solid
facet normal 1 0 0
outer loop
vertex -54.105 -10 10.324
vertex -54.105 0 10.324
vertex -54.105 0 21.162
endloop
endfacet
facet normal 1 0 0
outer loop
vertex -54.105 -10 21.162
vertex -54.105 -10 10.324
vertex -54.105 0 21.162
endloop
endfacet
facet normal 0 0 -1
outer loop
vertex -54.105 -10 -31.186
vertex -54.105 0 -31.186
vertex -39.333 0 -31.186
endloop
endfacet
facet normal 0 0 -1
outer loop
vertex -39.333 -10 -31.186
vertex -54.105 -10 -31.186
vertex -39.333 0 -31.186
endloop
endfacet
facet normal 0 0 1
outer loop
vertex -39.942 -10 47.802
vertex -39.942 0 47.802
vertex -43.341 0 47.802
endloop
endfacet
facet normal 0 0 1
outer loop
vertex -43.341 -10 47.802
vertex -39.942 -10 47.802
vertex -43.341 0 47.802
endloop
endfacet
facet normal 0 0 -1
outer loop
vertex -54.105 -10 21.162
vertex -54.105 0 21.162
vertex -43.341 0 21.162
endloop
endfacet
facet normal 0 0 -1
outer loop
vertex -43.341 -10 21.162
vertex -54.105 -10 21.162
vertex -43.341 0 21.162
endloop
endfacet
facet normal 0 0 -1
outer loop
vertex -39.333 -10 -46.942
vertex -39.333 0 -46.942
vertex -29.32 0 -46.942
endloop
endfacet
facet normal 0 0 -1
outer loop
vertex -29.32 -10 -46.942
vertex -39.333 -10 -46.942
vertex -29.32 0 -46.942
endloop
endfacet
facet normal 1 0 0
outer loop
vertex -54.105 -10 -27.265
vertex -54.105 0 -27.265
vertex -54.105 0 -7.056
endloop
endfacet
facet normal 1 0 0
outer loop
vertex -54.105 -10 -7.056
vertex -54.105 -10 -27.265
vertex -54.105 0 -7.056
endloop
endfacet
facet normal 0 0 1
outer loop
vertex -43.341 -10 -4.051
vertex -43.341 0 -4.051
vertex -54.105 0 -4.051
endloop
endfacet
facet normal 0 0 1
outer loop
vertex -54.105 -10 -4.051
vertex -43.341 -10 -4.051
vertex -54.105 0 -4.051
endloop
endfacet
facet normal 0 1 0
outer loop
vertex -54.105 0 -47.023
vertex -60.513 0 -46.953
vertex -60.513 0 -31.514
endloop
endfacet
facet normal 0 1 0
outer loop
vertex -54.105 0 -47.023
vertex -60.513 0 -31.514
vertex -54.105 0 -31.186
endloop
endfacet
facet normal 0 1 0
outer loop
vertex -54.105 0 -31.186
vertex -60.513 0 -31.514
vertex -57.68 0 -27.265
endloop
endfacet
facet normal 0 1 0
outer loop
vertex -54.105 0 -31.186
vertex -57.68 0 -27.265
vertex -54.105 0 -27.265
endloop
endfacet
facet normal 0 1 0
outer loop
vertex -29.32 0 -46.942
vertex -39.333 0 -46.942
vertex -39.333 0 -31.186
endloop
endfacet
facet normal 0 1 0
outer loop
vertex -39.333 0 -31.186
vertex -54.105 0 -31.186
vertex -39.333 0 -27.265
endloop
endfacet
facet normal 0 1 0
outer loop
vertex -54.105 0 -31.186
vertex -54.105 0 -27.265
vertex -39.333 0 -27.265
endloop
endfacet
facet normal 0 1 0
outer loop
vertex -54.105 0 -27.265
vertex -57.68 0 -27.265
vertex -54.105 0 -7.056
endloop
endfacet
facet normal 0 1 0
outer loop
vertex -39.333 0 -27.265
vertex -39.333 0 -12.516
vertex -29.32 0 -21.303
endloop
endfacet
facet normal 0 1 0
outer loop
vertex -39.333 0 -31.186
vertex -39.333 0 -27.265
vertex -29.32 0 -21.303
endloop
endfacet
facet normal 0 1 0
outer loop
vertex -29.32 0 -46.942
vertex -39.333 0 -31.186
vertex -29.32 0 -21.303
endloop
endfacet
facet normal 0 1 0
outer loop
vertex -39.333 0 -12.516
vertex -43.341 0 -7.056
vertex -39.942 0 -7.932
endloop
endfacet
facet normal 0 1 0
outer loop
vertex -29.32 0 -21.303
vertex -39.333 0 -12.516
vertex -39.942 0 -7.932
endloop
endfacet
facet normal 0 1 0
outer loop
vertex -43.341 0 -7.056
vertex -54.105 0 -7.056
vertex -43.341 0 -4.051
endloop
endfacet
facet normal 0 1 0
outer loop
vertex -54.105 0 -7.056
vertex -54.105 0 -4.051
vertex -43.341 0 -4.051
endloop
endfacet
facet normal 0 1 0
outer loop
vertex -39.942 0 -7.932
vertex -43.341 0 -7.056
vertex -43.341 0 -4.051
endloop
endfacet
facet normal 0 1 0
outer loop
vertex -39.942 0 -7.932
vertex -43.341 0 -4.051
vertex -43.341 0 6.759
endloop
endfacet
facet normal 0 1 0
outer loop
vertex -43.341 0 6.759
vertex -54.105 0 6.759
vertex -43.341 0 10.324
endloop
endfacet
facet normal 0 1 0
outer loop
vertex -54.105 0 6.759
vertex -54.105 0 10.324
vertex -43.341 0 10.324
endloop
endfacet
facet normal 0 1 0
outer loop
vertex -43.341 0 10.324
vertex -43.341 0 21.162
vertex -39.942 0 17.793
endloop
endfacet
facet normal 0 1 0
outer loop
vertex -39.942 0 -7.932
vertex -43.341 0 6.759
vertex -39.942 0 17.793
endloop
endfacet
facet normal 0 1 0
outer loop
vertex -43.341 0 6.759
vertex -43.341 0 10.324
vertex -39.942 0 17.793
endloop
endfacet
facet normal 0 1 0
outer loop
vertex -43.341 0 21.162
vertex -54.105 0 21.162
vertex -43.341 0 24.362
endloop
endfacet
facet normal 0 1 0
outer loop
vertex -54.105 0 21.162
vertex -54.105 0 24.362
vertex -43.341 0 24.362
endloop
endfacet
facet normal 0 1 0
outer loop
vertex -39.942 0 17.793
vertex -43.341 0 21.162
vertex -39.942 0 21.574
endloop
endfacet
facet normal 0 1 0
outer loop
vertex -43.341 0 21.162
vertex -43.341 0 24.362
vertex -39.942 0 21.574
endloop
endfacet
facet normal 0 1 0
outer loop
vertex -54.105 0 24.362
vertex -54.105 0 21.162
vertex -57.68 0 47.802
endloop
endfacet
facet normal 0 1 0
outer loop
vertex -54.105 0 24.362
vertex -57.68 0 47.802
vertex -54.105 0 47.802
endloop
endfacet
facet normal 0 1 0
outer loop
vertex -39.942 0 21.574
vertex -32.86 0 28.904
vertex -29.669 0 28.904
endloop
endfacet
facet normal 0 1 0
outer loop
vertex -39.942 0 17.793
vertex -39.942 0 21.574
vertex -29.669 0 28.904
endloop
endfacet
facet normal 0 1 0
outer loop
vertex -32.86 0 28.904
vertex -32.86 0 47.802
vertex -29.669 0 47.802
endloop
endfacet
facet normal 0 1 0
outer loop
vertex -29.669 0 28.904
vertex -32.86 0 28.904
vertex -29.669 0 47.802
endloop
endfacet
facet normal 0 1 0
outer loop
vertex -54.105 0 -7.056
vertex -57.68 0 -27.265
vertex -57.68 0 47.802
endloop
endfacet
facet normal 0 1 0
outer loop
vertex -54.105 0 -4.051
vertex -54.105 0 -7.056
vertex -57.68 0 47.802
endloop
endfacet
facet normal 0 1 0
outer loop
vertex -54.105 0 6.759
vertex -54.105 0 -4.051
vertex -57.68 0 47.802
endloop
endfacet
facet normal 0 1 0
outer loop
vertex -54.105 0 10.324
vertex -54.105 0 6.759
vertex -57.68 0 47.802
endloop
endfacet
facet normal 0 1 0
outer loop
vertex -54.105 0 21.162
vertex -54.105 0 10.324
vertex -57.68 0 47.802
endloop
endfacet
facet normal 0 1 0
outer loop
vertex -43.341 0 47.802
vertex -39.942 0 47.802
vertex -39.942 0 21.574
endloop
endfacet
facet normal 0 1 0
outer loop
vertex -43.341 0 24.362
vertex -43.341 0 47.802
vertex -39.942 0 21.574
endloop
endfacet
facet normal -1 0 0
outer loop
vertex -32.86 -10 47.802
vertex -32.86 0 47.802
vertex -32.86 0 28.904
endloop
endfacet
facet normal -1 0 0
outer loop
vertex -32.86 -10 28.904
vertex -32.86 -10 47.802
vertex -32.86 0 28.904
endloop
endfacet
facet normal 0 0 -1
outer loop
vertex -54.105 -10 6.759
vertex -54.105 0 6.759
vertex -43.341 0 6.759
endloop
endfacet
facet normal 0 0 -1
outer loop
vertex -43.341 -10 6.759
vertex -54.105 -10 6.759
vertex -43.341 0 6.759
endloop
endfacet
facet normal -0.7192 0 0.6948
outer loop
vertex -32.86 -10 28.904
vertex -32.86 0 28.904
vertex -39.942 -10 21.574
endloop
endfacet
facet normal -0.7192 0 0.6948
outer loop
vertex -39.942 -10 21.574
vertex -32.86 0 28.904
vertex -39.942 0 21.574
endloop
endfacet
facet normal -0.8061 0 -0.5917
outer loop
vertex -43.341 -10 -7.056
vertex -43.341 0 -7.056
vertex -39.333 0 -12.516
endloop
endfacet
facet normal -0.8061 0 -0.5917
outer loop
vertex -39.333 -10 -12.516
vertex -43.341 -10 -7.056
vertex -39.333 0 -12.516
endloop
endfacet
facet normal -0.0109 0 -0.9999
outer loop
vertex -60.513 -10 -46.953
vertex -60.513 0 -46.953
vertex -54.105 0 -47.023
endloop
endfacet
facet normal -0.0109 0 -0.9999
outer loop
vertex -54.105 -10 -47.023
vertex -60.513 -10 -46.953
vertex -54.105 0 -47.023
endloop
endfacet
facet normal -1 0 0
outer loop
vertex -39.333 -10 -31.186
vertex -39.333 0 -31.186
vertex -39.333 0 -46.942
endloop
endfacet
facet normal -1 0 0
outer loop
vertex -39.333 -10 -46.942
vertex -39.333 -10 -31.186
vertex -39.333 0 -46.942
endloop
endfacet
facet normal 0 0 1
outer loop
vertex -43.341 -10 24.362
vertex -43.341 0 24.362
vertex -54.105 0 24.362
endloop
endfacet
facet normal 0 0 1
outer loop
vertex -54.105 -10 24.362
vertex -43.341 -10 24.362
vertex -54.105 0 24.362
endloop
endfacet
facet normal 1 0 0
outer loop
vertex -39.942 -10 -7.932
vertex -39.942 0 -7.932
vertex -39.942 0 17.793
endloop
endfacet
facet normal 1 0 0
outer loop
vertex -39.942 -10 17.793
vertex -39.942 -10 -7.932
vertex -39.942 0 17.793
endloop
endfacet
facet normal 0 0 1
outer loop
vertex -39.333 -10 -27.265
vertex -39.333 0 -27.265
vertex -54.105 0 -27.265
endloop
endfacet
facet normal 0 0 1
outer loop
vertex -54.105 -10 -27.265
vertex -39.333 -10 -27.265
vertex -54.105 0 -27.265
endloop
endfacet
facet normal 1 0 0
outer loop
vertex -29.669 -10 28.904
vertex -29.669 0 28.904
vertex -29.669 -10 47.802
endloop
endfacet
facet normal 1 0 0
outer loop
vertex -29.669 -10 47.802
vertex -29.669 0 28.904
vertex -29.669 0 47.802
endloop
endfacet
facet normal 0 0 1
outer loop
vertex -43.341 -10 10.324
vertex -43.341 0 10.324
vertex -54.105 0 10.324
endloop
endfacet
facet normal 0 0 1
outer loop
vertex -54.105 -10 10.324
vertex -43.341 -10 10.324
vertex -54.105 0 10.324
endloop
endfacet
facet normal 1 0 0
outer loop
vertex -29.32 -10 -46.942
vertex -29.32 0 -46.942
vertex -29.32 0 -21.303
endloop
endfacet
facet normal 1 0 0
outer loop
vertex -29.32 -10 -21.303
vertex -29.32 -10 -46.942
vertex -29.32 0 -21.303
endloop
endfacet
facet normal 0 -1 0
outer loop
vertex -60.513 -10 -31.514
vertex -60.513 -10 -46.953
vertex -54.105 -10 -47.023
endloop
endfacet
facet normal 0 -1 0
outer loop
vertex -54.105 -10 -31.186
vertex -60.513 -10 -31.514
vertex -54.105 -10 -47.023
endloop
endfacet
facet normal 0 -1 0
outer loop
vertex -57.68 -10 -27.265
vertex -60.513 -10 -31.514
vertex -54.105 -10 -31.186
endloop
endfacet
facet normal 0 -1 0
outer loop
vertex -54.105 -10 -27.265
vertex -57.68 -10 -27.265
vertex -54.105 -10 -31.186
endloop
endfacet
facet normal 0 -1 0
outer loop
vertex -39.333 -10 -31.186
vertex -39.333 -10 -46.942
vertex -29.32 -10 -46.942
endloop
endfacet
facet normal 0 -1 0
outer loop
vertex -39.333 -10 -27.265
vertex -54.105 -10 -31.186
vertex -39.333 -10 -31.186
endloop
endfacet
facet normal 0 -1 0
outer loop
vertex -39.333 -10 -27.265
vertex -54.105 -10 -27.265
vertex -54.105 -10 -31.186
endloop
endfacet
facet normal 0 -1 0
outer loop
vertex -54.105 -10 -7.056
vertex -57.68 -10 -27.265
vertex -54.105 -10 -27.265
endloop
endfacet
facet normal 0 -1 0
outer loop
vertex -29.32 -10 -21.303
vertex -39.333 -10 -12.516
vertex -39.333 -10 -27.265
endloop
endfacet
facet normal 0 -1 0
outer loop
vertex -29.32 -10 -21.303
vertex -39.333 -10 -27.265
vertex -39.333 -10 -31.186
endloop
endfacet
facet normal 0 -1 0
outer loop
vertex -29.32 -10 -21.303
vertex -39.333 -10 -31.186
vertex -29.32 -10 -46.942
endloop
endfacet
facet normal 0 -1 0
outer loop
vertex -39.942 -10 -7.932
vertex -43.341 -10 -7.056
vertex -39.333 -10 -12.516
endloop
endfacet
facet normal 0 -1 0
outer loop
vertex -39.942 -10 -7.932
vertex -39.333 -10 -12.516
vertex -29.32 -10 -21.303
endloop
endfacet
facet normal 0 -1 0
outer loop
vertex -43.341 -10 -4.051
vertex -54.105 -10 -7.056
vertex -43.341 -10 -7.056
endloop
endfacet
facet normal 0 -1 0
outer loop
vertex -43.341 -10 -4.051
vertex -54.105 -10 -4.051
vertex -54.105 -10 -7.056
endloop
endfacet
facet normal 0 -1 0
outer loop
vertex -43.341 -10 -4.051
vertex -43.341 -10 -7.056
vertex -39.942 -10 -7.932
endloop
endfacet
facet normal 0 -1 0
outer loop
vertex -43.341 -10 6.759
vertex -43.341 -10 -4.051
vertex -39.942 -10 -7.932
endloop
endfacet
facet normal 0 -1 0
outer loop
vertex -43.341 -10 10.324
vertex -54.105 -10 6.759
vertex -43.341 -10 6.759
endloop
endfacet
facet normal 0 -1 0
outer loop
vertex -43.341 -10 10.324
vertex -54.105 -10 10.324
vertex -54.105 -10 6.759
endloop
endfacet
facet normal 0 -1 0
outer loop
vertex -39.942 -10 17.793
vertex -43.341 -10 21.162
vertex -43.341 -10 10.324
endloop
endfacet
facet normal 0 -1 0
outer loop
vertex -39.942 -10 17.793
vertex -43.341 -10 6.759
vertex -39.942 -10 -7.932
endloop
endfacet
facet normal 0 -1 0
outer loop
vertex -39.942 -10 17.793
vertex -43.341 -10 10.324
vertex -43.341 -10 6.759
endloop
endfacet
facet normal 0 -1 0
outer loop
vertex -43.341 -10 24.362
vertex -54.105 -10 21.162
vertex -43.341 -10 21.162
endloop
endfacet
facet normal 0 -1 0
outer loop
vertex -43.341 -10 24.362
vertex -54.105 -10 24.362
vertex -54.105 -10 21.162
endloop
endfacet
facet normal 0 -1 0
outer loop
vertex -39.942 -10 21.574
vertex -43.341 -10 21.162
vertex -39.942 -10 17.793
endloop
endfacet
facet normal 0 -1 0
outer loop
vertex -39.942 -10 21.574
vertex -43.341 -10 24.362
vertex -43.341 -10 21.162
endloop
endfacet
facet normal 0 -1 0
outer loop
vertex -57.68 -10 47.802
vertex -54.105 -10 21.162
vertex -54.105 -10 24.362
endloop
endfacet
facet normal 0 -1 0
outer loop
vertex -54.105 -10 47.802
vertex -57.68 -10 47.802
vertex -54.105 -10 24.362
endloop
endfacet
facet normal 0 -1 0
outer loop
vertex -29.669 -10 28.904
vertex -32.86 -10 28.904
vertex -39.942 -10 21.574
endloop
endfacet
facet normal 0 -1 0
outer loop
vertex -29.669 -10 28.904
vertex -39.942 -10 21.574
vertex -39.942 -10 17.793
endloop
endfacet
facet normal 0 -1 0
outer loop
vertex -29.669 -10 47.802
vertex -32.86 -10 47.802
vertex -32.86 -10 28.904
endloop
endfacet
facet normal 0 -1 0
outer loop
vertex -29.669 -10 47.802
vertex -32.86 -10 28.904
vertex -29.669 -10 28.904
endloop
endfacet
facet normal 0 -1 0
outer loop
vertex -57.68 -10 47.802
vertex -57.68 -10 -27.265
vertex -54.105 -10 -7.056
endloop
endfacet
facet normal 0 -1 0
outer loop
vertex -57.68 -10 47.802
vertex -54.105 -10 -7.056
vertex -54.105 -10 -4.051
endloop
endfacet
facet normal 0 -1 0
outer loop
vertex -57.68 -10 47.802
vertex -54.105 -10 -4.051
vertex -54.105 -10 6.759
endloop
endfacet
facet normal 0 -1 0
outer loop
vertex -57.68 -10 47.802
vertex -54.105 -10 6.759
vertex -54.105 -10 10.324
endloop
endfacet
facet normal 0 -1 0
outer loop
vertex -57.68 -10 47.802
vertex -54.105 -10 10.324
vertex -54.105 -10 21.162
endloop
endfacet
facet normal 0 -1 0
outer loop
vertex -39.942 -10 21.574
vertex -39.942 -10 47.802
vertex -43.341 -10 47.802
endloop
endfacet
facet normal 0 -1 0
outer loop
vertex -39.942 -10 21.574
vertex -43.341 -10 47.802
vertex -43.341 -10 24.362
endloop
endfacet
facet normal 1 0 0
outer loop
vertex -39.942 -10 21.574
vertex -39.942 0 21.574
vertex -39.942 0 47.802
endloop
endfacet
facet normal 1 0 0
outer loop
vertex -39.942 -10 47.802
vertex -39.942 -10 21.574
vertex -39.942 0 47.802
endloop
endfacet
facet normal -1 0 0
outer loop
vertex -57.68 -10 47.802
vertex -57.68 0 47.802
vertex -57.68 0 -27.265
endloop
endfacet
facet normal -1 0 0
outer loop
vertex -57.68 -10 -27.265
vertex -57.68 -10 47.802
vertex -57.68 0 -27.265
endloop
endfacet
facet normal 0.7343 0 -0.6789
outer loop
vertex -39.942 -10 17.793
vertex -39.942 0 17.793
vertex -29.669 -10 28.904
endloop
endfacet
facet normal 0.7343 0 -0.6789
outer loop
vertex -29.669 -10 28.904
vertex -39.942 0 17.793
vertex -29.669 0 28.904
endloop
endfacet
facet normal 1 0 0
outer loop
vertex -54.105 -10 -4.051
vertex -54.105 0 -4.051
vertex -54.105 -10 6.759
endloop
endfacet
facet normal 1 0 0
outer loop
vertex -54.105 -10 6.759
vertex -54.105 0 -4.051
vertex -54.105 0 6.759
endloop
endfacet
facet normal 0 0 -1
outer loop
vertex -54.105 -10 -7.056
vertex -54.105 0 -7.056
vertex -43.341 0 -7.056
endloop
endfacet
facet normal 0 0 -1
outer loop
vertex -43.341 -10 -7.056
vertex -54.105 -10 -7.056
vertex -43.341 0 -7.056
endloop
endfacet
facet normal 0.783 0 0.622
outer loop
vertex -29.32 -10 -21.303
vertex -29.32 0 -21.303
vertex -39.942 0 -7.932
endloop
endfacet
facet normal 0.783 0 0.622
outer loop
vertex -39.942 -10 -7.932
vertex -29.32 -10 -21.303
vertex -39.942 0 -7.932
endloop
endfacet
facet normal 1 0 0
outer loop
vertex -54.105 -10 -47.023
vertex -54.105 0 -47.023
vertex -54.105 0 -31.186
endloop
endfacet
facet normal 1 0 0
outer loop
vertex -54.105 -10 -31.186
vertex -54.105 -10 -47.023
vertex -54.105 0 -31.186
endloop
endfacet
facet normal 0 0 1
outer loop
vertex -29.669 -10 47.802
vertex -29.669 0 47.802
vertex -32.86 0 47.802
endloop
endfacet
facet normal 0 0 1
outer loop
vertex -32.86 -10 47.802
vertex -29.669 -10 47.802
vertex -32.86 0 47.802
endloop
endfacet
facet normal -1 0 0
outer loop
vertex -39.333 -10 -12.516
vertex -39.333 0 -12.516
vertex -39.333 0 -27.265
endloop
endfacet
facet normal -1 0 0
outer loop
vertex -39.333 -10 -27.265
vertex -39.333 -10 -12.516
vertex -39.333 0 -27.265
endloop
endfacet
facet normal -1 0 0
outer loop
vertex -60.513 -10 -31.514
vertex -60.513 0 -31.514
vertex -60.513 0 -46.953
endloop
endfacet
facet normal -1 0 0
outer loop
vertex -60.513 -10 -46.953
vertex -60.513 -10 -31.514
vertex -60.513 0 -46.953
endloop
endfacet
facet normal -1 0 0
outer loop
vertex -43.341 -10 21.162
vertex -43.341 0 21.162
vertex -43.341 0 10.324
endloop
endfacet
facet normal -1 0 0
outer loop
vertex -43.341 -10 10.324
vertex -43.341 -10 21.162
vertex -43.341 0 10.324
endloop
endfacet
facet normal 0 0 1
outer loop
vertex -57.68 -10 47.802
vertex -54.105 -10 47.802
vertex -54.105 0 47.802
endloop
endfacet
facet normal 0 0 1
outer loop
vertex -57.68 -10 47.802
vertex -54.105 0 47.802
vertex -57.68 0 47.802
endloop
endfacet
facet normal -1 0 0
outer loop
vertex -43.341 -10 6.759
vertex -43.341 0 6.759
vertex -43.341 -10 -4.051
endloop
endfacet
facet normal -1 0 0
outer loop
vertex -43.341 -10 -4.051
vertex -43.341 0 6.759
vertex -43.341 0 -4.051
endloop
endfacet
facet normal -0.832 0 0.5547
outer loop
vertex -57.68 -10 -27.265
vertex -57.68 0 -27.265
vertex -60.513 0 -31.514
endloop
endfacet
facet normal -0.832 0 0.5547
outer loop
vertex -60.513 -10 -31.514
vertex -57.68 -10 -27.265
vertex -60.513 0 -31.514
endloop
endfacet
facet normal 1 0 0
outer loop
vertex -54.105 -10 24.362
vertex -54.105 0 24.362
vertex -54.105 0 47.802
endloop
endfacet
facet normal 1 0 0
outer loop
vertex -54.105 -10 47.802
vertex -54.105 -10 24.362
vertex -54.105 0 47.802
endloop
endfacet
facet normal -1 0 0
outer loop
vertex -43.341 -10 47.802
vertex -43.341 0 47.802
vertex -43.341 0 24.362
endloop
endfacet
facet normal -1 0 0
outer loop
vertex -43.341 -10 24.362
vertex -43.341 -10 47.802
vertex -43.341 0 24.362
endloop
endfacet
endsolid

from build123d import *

# Parameters (mm, degrees)
F1_DEPTH = 10


# Not quite as in the source:
# - a feature of the source that left no trace in its solid (it failed there, or was rolled back) is left out


with BuildPart() as f1:
    # F0 (on Front) → F1 (new body)
    with BuildSketch(Plane.XZ):
        Polygon((-54.1052184999, 47.8023849428), (-57.6798580587, 47.8023849428), (-57.6798580587, -27.2650625557), (-60.5125948787, -31.5141640604), (-60.5125948787, -46.9525642693), (-54.1052184999, -47.0233857632), (-54.1052184999, -31.1857834458), (-39.3331050873, -31.1857834458), (-39.3331050873, -46.9423271716), (-29.3199270964, -46.9423271716), (-29.3199270964, -21.3033463806), (-39.9415493011, -7.9316543415), (-39.9415493011, 17.7926272154), (-29.6685695648, 28.9044026285), (-29.6685695648, 47.8023849428), (-32.8597128391, 47.8023849428), (-32.8597128391, 28.9044026285), (-39.9415493011, 21.5739104897), (-39.9415493011, 47.8023849428), (-43.3408282697, 47.8023849428), (-43.3408282697, 24.3615116924), (-54.1052184999, 24.3615116924), align=None)
        Polygon((-54.1052184999, -7.0560085587), (-43.3408282697, -7.0560085587), (-39.3331050873, -12.5158438459), (-39.3331050873, -27.2650625557), (-54.1052184999, -27.2650625557), align=None, mode=Mode.SUBTRACT)
        Polygon((-43.3408282697, 6.7588053644), (-43.3408282697, -1.2844107114), (-43.3408282697, -4.0514403954), (-54.1052184999, -4.0514403954), (-54.1052184999, 6.7588053644), align=None, mode=Mode.SUBTRACT)
        Polygon((-43.3408282697, 21.1618710309), (-43.3408282697, 11.6142081097), (-43.3408282697, 10.3236073628), (-54.1052184999, 10.3236073628), (-54.1052184999, 21.1618710309), align=None, mode=Mode.SUBTRACT)
    extrude(amount=F1_DEPTH)


solid = f1.part
